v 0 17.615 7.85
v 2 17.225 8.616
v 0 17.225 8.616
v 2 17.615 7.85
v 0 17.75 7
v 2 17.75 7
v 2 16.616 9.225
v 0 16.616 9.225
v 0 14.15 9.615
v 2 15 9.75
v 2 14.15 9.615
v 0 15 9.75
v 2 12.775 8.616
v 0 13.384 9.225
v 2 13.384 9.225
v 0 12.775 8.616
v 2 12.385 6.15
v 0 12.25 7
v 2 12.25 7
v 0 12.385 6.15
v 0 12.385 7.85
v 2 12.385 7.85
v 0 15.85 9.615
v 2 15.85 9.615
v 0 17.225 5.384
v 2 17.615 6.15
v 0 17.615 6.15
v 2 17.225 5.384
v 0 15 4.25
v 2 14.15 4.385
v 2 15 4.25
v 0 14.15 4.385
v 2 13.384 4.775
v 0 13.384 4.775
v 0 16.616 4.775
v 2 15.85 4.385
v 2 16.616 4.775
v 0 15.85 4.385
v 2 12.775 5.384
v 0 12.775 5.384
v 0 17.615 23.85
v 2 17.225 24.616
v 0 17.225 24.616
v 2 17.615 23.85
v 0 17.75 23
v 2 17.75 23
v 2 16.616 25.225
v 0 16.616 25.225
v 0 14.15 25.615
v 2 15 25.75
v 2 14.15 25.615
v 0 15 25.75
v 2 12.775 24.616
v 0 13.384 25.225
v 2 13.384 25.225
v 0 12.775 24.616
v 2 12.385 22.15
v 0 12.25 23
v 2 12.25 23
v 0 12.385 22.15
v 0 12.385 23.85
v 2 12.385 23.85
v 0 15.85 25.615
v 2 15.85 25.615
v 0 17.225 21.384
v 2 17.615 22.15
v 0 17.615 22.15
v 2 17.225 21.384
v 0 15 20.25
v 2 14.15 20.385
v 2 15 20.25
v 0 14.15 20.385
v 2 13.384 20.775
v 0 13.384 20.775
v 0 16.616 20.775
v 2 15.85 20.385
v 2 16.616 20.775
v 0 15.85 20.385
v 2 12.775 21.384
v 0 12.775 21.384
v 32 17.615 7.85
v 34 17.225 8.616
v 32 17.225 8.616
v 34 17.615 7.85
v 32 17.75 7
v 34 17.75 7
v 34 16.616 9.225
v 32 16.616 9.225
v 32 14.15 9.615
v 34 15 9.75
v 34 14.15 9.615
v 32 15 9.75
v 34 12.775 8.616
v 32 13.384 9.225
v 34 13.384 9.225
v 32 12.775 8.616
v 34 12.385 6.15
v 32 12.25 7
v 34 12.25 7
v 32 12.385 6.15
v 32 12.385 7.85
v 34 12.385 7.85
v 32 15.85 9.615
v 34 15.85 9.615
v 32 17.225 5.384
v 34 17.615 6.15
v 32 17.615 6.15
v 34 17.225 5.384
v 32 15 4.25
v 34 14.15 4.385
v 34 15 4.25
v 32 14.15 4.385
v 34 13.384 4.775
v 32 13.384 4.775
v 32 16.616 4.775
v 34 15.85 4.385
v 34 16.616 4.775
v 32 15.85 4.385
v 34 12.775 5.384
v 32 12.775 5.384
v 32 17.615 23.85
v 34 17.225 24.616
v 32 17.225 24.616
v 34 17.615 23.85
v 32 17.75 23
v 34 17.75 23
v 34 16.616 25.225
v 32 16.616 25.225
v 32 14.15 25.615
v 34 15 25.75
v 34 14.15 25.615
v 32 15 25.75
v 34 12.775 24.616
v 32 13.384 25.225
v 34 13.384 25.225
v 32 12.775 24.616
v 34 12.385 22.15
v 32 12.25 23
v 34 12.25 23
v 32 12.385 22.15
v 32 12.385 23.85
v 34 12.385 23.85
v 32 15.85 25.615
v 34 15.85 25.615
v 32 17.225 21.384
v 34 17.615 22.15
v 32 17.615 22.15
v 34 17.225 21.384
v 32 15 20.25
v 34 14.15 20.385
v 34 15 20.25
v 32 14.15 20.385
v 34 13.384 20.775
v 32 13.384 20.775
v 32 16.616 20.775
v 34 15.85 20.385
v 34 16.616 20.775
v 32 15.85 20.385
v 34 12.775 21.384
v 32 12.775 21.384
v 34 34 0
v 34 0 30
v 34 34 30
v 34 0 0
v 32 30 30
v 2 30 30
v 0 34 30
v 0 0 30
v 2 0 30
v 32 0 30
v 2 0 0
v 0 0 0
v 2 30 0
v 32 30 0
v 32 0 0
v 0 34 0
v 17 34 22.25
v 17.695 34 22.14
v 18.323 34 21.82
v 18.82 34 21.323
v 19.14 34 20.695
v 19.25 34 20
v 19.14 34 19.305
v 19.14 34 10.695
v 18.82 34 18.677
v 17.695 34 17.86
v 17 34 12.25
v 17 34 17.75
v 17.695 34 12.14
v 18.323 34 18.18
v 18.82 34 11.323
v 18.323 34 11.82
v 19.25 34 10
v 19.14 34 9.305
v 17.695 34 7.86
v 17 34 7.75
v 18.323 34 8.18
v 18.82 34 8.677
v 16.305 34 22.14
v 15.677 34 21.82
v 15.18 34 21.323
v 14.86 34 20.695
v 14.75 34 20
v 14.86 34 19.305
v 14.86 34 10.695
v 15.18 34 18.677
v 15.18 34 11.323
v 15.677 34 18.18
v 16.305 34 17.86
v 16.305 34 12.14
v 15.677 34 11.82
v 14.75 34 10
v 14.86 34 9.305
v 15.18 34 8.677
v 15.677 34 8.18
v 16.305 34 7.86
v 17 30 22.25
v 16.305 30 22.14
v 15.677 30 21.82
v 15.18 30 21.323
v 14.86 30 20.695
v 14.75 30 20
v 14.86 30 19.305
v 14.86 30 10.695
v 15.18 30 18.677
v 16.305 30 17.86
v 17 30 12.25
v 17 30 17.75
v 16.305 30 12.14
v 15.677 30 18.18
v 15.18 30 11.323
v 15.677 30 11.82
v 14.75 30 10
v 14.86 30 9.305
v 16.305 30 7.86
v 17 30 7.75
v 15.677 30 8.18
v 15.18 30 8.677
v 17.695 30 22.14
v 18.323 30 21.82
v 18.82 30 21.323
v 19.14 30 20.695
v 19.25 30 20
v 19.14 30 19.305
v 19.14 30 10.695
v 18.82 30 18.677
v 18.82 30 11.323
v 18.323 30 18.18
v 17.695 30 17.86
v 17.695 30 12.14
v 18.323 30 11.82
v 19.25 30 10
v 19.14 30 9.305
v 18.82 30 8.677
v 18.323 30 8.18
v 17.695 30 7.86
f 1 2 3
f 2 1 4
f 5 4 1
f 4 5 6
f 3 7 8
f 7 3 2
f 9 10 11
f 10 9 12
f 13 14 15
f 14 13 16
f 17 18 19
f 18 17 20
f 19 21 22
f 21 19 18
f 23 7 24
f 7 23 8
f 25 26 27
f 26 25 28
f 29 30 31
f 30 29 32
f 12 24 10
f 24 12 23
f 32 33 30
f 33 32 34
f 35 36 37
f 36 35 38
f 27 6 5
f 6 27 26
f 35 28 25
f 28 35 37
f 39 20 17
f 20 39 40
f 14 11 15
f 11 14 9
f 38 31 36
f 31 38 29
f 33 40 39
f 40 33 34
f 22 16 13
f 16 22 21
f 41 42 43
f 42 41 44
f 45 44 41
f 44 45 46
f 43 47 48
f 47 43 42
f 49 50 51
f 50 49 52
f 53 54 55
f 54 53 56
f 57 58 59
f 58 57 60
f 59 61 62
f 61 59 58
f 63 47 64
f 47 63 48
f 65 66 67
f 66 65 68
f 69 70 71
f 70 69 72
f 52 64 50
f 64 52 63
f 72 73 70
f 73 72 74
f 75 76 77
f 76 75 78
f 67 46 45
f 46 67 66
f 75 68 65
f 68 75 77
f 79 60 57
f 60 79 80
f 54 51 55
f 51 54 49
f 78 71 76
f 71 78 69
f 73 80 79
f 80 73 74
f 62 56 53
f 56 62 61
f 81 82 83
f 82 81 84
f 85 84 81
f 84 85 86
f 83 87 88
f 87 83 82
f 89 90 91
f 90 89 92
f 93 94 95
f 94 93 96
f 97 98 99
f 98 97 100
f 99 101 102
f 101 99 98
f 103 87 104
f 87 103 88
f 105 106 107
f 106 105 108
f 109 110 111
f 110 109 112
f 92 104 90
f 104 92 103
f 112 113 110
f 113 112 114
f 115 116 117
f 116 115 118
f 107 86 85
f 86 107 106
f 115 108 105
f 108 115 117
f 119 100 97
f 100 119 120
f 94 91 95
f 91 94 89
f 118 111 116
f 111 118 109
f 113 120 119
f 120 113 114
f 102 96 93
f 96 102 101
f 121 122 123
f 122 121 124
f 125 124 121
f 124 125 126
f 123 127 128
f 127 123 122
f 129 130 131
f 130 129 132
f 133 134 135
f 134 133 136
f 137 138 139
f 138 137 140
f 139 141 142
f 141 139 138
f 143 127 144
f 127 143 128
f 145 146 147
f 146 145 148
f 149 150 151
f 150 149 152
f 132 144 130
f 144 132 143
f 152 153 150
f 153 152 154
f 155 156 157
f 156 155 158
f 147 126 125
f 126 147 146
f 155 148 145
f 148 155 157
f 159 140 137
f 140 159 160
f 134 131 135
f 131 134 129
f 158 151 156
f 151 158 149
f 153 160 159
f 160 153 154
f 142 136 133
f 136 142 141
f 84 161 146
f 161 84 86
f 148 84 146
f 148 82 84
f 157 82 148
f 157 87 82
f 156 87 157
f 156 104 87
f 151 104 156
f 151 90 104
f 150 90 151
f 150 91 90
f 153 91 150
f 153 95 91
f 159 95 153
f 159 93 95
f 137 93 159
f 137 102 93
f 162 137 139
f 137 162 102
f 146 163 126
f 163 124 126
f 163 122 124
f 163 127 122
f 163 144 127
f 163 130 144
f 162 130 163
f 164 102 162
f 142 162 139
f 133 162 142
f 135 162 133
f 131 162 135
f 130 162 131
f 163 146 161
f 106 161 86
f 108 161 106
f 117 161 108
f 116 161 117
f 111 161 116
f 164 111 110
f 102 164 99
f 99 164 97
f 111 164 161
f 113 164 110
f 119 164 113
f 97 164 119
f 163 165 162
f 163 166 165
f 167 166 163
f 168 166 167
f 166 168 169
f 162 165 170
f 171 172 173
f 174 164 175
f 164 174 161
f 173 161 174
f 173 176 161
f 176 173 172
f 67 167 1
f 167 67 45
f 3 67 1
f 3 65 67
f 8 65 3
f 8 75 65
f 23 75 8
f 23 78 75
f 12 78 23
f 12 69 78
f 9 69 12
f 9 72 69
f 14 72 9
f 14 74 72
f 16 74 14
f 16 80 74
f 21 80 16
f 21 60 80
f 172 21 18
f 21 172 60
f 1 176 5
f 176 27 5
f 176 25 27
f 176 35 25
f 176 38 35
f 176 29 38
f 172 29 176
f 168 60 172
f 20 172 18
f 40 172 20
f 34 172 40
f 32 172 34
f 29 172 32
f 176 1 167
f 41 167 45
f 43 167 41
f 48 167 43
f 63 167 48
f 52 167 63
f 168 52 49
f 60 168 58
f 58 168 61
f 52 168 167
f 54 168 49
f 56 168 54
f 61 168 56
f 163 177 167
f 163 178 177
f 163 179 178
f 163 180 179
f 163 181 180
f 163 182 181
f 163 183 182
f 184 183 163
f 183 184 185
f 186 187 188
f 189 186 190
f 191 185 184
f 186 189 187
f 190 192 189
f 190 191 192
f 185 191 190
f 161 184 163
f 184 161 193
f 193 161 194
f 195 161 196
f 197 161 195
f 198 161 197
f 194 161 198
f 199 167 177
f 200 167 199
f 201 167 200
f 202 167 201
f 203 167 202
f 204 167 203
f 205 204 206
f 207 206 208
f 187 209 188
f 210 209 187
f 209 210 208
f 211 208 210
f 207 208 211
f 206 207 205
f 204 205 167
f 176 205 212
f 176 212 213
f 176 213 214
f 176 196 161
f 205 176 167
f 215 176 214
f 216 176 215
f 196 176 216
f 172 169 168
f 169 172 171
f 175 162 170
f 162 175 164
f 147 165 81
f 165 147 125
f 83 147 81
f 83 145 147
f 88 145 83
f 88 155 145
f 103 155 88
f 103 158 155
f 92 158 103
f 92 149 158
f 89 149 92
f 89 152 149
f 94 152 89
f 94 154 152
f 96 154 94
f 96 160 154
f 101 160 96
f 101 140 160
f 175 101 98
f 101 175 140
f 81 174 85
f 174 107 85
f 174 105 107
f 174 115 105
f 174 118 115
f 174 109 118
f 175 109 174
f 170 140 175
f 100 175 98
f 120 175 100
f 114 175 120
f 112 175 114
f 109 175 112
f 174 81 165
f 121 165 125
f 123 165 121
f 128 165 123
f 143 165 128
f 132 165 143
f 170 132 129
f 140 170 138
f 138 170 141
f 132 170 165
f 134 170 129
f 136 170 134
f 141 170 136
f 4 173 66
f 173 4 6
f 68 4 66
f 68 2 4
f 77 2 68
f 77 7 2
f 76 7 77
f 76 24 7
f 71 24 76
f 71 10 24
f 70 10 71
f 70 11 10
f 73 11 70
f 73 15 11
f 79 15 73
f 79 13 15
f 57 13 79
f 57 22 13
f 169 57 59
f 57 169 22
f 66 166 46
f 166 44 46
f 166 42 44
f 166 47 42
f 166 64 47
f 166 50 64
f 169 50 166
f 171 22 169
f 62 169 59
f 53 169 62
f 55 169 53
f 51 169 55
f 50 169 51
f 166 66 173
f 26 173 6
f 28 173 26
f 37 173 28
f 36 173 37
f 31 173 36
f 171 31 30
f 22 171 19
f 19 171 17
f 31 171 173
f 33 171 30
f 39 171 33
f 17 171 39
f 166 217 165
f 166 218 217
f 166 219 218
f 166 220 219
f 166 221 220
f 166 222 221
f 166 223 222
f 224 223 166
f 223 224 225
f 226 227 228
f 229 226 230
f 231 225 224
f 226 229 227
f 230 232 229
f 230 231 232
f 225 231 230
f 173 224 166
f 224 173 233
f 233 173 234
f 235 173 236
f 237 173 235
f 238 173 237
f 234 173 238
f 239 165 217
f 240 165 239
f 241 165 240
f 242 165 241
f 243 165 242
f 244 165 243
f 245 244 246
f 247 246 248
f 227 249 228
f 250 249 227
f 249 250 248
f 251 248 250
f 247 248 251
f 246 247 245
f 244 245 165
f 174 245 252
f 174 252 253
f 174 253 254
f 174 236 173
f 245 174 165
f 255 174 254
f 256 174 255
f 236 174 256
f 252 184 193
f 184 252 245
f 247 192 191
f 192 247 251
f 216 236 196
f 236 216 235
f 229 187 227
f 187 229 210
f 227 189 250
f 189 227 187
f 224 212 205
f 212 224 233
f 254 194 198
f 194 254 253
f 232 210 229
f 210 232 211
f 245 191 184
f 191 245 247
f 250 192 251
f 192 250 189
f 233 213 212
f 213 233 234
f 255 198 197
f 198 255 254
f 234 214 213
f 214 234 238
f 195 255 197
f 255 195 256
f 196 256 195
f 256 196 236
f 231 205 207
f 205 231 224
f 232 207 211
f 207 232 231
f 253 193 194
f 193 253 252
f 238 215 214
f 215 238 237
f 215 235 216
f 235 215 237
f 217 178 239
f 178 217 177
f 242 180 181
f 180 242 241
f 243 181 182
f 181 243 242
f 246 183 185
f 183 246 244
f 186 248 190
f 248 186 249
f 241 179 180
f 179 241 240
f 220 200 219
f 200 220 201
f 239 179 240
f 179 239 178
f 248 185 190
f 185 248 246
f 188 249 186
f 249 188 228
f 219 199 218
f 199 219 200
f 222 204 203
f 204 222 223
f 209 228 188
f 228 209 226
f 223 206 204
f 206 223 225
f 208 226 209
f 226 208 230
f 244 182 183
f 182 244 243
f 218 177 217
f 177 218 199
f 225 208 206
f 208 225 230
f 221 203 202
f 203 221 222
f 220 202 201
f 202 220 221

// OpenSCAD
// file: ../lib/ALU_profile_holder_side.scad
include <../../parameters.scad>



module ALU_profile_holder_side() {
    wall_thickness = ALU_profile_holder_wall_thickness;
    
    //díry na přišroubování k Al profilům
    module screws_holes(diameter) {
        translate([0, 0, 7])
            rotate([90, 0, 90])
                cylinder(d=diameter, h=wall_thickness*2, center=true, $fn=20);
        
        translate([0, 0, strain_gauge_screw_distance+13])
            rotate([90, 0, 90])
                cylinder(d=diameter, h=wall_thickness*2, center=true, $fn=20);
    }
    
    difference() {
        cube([ALU_profile_width+wall_thickness*2, ALU_profile_width+wall_thickness*2, strain_gauge_screw_distance+20]);

        translate([wall_thickness, 0, 0])
        cube([ALU_profile_width, ALU_profile_width, strain_gauge_screw_distance+20]);
        
        translate([wall_thickness*0.5, ALU_profile_width/2, 0]) {
                screws_holes(M5_screw_diameter);
                translate([ALU_profile_width+wall_thickness, 0, 0]) {
                    screws_holes(M5_screw_diameter);
                }
        }
    }
}

ALU_profile_holder_side();
// file: ../../parameters.scad
//Main tube diameter - hole [mm]
main_tube_outer_diameter = 25.4;
main_tube_inner_diameter = 23.05;

//Tube for undercarriage - rendered hole [mm]
tube_for_undercarriage_outer_diameter = 10.6;
tube_for_undercarriage_inner_diameter = 6;
global_clearance = 0.5;


// Nastavení parametrů rotoru

gliding_aggle = 14;         // tenhle úhel by se zřejmě v budoucnu měl počítat z požadované klouzavosti.


rotor_blade_AOA = 1.5;      // nastavení úhlu náběhu rotorového listu
rotor_blade_length = 970;   // délka rotorového listu
rotor_blade_depth = 50;     // hloubka rotorového listu

// nastavení parametrů motoru

engine_angle = -8;
engine_diameter = 55;
engine_offset = 55;

engine_screws_radius = 15;
engine_holes_radius = (24 + 44)/4;
engine_shatf_hole_diameter = 13;

// Parameters of tube couplings
coupling_wall_thickness = main_tube_outer_diameter/5;  //width of coupling walls
thickness_between_tubes = main_tube_outer_diameter/10;    // minimum distance between tubes in couplings

coupling_wall_thickness_undercarriage = tube_for_undercarriage_outer_diameter/3;
thickness_between_tubes_undercarriage = tube_for_undercarriage_outer_diameter/10;

608_bearing_outer_diameter = 22.3;
608_bearing_thickness = 7.1;


// screw length step - minimum difference in length between two types of screws
basic_screw_length = 5;


//Screw diameter and nut for M10 [mm]
M10_screw_diameter=10.4;
M10_head_height = 10;
M10_head_diameter = 16+0.5;
M10_nut_height = 10.5;
M10_nut_diameter = 25.5;
M10_nut_pocket = 22.3;

//Screw diameter for M8 [mm]
M8_screw_diameter = 8.6;
M8_head_height = 8;
M8_head_diameter = 13.5;
M8_nut_height = 7.5;
M8_nut_diameter = 14.4 + 0.5;
M8_nut_pocket = 13 + 0.5;

//Screw diameter and nut for M6 [mm]
M6_screw_diameter=6.5;
M6_head_diameter = 10+0.5;
M6_head_height = 6;
M6_nut_height = 4.9;
M6_nut_diameter = 11.8;
M6_nut_pocket = 10.4;

//Screw diameter and nut for M5 [mm]
M5_screw_diameter=5.5;
M5_head_height = 5;
M5_head_diameter = 13+0.5;
M5_nut_height = 4.5;
M5_nut_diameter = 9.4;
M5_nut_pocket = 8.4;

//Screw diameter and nut for M4 [mm]
M4_screw_diameter=4.5;
M4_screw_head_height = 4;
M4_nut_height = 3.2;
M4_nut_diameter = 8.4;
M4_nut_pocket = 7.5;

//Screw diameter and nut for M3 [mm]
M3_screw_diameter = 3.2;
M3_nut_height = 2.7;
M3_nut_diameter = 6.6;
M3_screw_head_height = 3;

//Screw diameter and nut for M2,5 [mm]
M2_5_screw_diameter = 2.7;
M2_5_nut_height = 2.3;
M2_5_nut_diameter = 6;
M2_5_nut_pocket = 5.5;


//šroub servo
Servo_screw = 1.5;

//The tube for help
Help_main_tube_outer = 25;
Help_main_tube_inner = 23;
Help_tube_for_undercarriage_outer = 10;
Help_tube_for_undercarriage_inner = 5;


//main hull parameters

hull_drop_length = 580;
hull_wall_thickness = 0.8;
hull_y_size = 120;
hull_z_size = 150;
hull_x_size = 580;
hull_corner_radius = 4;
hull_airfoil_thickness= 35;  // thickness of drop generating airfoil in percent of length.
hull_scale_x = 1;
hull_scale_y = 1.5;
hull_scale_z = 1.5;

main_pilon_position = 170+68+30;       // pozice rotorového pilonu měřená od přední části krytu
cover_pilon_position = 180;
height_of_vertical_tube = 275; //278mm je změřená délka trubky.

//délka hlavní dlouhé trubky
length_of_main_tube = 820;
length_of_undercarriage_tube = 300;

ribbon_width = 5; // šířka vyztužovacích lemů.

// šířka otvoru v přední části kapoty pro držák motoru.
width_of_engine_holder = 63;

//Top Cover Division - dělení horního krytu pro tisk
top_cover_division = [0, 50, 150, 280, 410, hull_x_size]; // upraveny seznam tak, aby deleni začinalo od nuly, což umožňí úplně automatické rozdělení.

//Bottom Cover Division - dělení dolního krytu pro tisk
bottom_cover_division = [0,100,232.5,365, 470, hull_x_size];
// zkrácená část pro payload pro testovací tisk
//bottom_cover_division = [0,200,250,365, 470, hull_x_size];




rotor_height = height_of_vertical_tube + main_tube_outer_diameter/2 + 2*global_clearance + thickness_between_tubes + 30; // změřená výška rotoru je 367mm
center_of_gravity_position = [main_pilon_position - tan(gliding_aggle)*rotor_height, 0, 0];



//Cover pilon division - na výšku (v ose Z)
cover_pilon_division = [0,170,height_of_vertical_tube + main_tube_outer_diameter + coupling_wall_thickness];

//pozice šroubů
	//horní kryt
top_screw_position = [0,
                    (top_cover_division[0] + top_cover_division[1])/2,
                    (top_cover_division[2] - top_cover_division[1])/2 + top_cover_division[1],
                    (top_cover_division[3] - top_cover_division[2])/2 + top_cover_division[2],
                    (top_cover_division[4] - top_cover_division[3])/8 + top_cover_division[3],
                    (top_cover_division[5] - top_cover_division[4])/2 + top_cover_division[4] - top_cover_division[1]/3];
	//spodní kryt
bottom_screw_position = [0,
                        (bottom_cover_division[0] + bottom_cover_division[1])*(2/6),
                        bottom_cover_division[1]*(9/10),
                        bottom_cover_division[3] + bottom_cover_division[1]*(1/10),
                        bottom_cover_division[3] + bottom_cover_division[1]*(3/5)];




//šířka zámků
lock_width = 10;

//délka zámků
lock_length = 3;


//accumulator
//základní rozměry akumulátoru
width_of_accumulator = 129.4;//45+1;
depth_of_accumulator = 40.61;
height_of_accumulator = 43.65;
//Zapuštění akumulátoru
sink_of_accumulator = 5; //main_tube_outer_diameter/5 - M3_nut_height*1.5;

//tloušťka hrany spojky
accumulator_holder_width = 18;
accumulator_holder_thickness = 10;

//posunutí akumálátoru na podložce
move_of_accumulator = 75;   // pozice akumulátoru (ovlivňuje těžiště)


////////////////
// Senzory
///////////////////

//opticalFlow
width_optical_flow_senzor = 45.5;
depth_optical_flow_senzor = 6;
height_optical_flow_senzor = 35;
sink_of_optical_flow_senzor = depth_optical_flow_senzor - 5;
M3_optical_flow_senzor_Z = 30.4;
M3_optical_flow_senzor_X = 24;
M3_optical_flow_senzor_Z_alone = 9.1;
M3_optical_flow_senzor_X_alone = 16.7;

//GPS anténa
GPS_outer_length = 48.01;   //Vnější rozměr
GPS_inner_length = 37.48;   //Vnitřní rozměr
GPS_diameter = (GPS_outer_length - GPS_inner_length)/2;    //Průměr otvoru
GPS_middle_length = GPS_diameter + GPS_inner_length;      //Střední rozměr


////podzvozek

radius_undercarriage = 25;
vzdalenost_x = tan(20) * 131;
vzdalenost_y = (131 - radius_undercarriage)/tan(79);
uhel_y = 90 - 20;
uhel_x = 90 - 79;

maximum_printable_size = 150;


////Pitotova trubice
Pitot_tube_diameter = 4.02 + 1;
Distance_hole_from_tube = 11.92;  //vzdálenost otvoru pro připevnění od samotné trubičky


////směrové kormidlo
Rudder_length = 4*main_tube_outer_diameter;
Rudder_height = 2*main_tube_outer_diameter;
Rudder_depth = main_tube_outer_diameter/2;
gap_width = 2*hull_wall_thickness;      //šířka mezery mezi směrovkou a ocasní plochou
ruder_shaft_diameter = 2.6; //otočné uchycení směrovky - průměr 2 mm


/////spojka 666_1004

    width_666_1004 = (main_tube_outer_diameter+2*coupling_wall_thickness - M3_screw_head_height)/basic_screw_length;
//        echo("width_666_1004 is", width_666_1004);

//        echo("ceil_666_1004 is", ceil(width_666_1004));

    coupling_screw_length_666_1004 = (ceil(width_666_1004)) * basic_screw_length;
        echo("coupling_screw_length_666_1004 is", coupling_screw_length_666_1004);

    coupling_width_666_1004 = coupling_screw_length_666_1004 + M3_screw_head_height;
//        echo("coupling_width_666_1004 is", coupling_width_666_1004);

    height_666_1004 = coupling_width_666_1004;
//        echo("height_666_1004 is", height_666_1004);

    depth_666_1004 = main_tube_outer_diameter*2+2*coupling_wall_thickness+thickness_between_tubes;
//        echo("depth_666_1004 is", depth_666_1004);

    depth_666_1004_drillhelper = main_tube_outer_diameter*3;

/////spojka 666_1026



    width_666_1026 = main_tube_outer_diameter + 2*thickness_between_tubes;

    depth_666_1026 = (main_tube_outer_diameter*2)/basic_screw_length;
//        echo("depth_666_1026 is", depth_666_1026);

//        echo("ceil_666_1026 is", ceil(depth_666_1026));

    coupling_screw_length_666_1026 = (ceil(depth_666_1026)) * basic_screw_length;
        echo("coupling_screw_length_666_1026 is", coupling_screw_length_666_1026);


    thickness_of_plate = coupling_screw_length_666_1026 - M4_screw_head_height - 50; //50 mm je konstatní šířka spojky 666_1026
    echo("thickness_of_plate is", thickness_of_plate);

    coupling_depth_666_1026 = coupling_screw_length_666_1026 - M4_screw_head_height - thickness_of_plate;      //zde je odečten M4_screw_head_height pro určení šířky, tak aby šroub přesahoval pro potřebnou matku
//        echo("coupling_depth_666_1026 is", coupling_depth_666_1026);

    height_666_1026 = 2*main_tube_outer_diameter;
//        echo("height_666_1026 is", height_666_1026);

//tloušťka plechu pro zajištění konstatní šířky spojky 50 mm

    width_666_1026_drillhelper = main_tube_outer_diameter*2;

    depth_666_1026_drillhelper = main_tube_outer_diameter + 4*thickness_between_tubes;


////spojka 666_1017

    width_666_1017 = (main_tube_outer_diameter + 4*coupling_wall_thickness - M3_screw_head_height)/basic_screw_length;
//        echo("width_666_1017 is", width_666_1017);

//        echo("ceil_666_1017 is", ceil(width_666_1017));

    coupling_screw_length_666_1017 = (ceil(width_666_1017)) * basic_screw_length;
        echo("coupling_screw_length_666_1017 is", coupling_screw_length_666_1017);

    coupling_width_666_1017 = coupling_screw_length_666_1017 + M3_screw_head_height;
//        echo("coupling_width_666_1017 is", coupling_width_666_1017);

    depth_666_1017 = coupling_width_666_1017;

    height_666_1017= 70; //main_tube_outer_diameter*1.8+main_tube_outer_diameter+wall_thickness;

    width_666_1017_drillhelper = main_tube_outer_diameter+4*thickness_between_tubes;

    depth_666_1017_drillhelper = main_tube_outer_diameter*2;


////spojka 666_1014

    width_666_1014 = tube_for_undercarriage_outer_diameter + 2*coupling_wall_thickness_undercarriage;

    depth_666_1014 = tube_for_undercarriage_outer_diameter + M3_screw_diameter + 2*coupling_wall_thickness_undercarriage + thickness_between_tubes_undercarriage;

    height_666_1014 = width_666_1014;


    width_666_1014_drillhelper = 2*tube_for_undercarriage_outer_diameter + 2*coupling_wall_thickness_undercarriage;



////spojka 666_1015

    width_666_1015 = tube_for_undercarriage_outer_diameter + 2*coupling_wall_thickness_undercarriage;

    depth_666_1015 = tube_for_undercarriage_outer_diameter*2 + 2*coupling_wall_thickness_undercarriage + thickness_between_tubes_undercarriage;

    height_666_1015 = width_666_1015;


    width_666_1015_drillhelper = 2*tube_for_undercarriage_outer_diameter + 2*coupling_wall_thickness_undercarriage;

////spojka 666_1016

    width_666_1016 = tube_for_undercarriage_outer_diameter + 2*coupling_wall_thickness_undercarriage;

    depth_666_1016 = tube_for_undercarriage_outer_diameter + M6_screw_diameter + 2*coupling_wall_thickness_undercarriage + thickness_between_tubes_undercarriage;

    height_666_1016 = width_666_1016;


    width_666_1016_drillhelper = 2*tube_for_undercarriage_outer_diameter + 2*coupling_wall_thickness_undercarriage;




//umístění podvozkových trubek

second_undercarriage_hole =height_666_1026 + height_666_1004/2 + 170 + 160;


//Base Divison - dělení podložky
base_division = [0, 159, main_pilon_position + coupling_width_666_1017/2 + global_clearance/2, second_undercarriage_hole + coupling_width_666_1004/2 + global_clearance/2, hull_x_size];

// šrouby pro připevnění podložky k hlavní trubce
base_mounting_screw_length = 50;


// kulove lozisko

bearing_efsm_08_h = 33+1;
bearing_efsm_08_m = 22;
bearing_efsm_08_db = 18;
bearing_efsm_08_ag = 10.5;
bearing_efsm_08_n = M4_screw_diameter;
bearing_efsm_08_a1 = 5.5;
bearing_efsm_08_d = 8.25;
bearing_efsm_08_B = 8; // ball height

bearing_efsm_10_h = 38+1;
bearing_efsm_10_m = 26;
bearing_efsm_10_db = 21.9;
bearing_efsm_10_ag = 12+0.2;
bearing_efsm_10_n = M5_screw_diameter;
bearing_efsm_10_a1 = 6.5;
bearing_efsm_10_d = 10.25;


bearing_efsm_12_width = 40+1;
bearing_efsm_12_h = bearing_efsm_12_width;
bearing_efsm_12_boltd = 28/2; // polovina vzdalenosti mezi srouby
bearing_efsm_12_m = bearing_efsm_12_boltd*2;
bearing_efsm_12_db = 25;
bearing_efsm_12_ag = 13;
bearing_efsm_12_a1 = 7;
bearing_efsm_12_n = M5_screw_diameter;
bearing_efsm_12_d = 12.15;
bearing_efsm_12_B = 10; // ball height
bearing_efsm_space = 1;

bearing_efsm_17_width = 54+1;
bearing_efsm_17_h = bearing_efsm_17_width;
bearing_efsm_17_boltd = 38/2; // polovina vzdalenosti mezi srouby
bearing_efsm_17_m = bearing_efsm_17_boltd*2;
bearing_efsm_17_db = 35;
bearing_efsm_17_ag = 18;
bearing_efsm_17_n = M6_screw_diameter;
bearing_efsm_17_a1 = 10;
bearing_efsm_17_B = 17; // ball height

//limcove lozisko
bearing_EFOM_10_L=26; //celkova sirka zakladny
bearing_EFOM_10_d1=10.3;//diametr otvoru real=10 mm
bearing_EFOM_10_dB=22;//diametr vystupku pro ulozeni lozika
bearing_EFOM_10_H=52;//celková delka zakladny
bearing_EFOM_10_J=36;// hole pitch
bearing_EFOM_10_A1=6.5;//vyska pouzdra
bearing_EFOM_10_Ag=12;//celkova vyska
bearing_EFOM_10_N1=5;//sirka otvoru pro sroub
bearing_EFOM_10_N2=8;//delka otvoru pro sroub
bearing_EFOM_10_m=36;//roztec der pro sroub
bearing_EFOM_10_h=9;//vyska lozika




// 20 KG servo parameters


servo_20kg_axis_offset = 9.375; // jak je osa mimo stredu
servo_20kg_body_x = 42;
servo_20kg_body_y = 21;
servo_20kg_body_z = 40;
servo_20kg_thread_x = 49/2;
servo_20kg_thread_y = 10/2;
servo_20kg_body_below = 10; // jak hluboko je tělo serva pod drzaky na srouby
servo_20kg_below = 25.8; // jak hluboko je páka serva pod drzaky na srouby

servo_20kg_bolt_d = 2.5+0.3;
servo_20kg_nut_d = 5+0.3;



//  888_2***
//    G2
//


g2_0_part_space = 2; // mezera mezi zadni a predni casti

g2_5_height = 608_bearing_outer_diameter*1.5;
g2_5_width = 70+5.5+11;
g2_5_threads = 2; // kolik ma byt sroubu skrz nosnou tyc

g2_5_m3_length = base_mounting_screw_length; // sroub, ktery se pouziva na sesroubovani s nosnou tyci
g2_5_servo_shift = 30;
g2_5_servo_wall = 5;

g2_5_m8_length = 60; // sroub, ktery se pouziva jako osa pro podlozku
g2_5_front_l = main_tube_outer_diameter + 608_bearing_outer_diameter*2;// jak moc ma byt magnet v predu

g2_5_zapusteni_serva = 30;
g2_5_length = g2_5_zapusteni_serva + 2*main_tube_outer_diameter + 30;
g2_5_length_offset = -10;

g2_5_bearing_space = 2; // mezera pro podlozku mezi loziskem a stenou..


g2_0_vertical_bolts = 2;
g2_0_space_btw_wheel_holder = 25.8;

g2_6_plate_thickness = 8;
g2_6_servo_distance = 54; // jak je daleko servo pred tyci kola
g2_6_servo_shift = 0; // jak je osa serva mimo stredu
g2_6_servo_bolt_l = 8; // delka sroubu od konce serva po zacatek matky
g2_6_min_wall_around = 8; // minimalni material okolo serva




// pro dily ze skupiny 3 (888_30**)
g3_0_cone1 = 70;
g3_0_cone2 = 50;
g3_0_cone_height = 25;
g3_0_cone_top_height = 11;
g3_0_height = g3_0_cone_height + 40;
g3_0_bearing_bolt_len = 50;
g3_0_srcew_dist = 55;


// Nastavní volností skupiny dílů 888_30**
// Nastavení rozsahů je v deg
g3_0_pitch_limit = [-20:3:20];
g3_0_roll_limit = [-15:3:15];
g3_0_yaw_limit = [-10:3:10];


//pro zakladnu na strechu auta
g3_1_yaw_width = 75;
g3_1_service_holl_height = 8.4 + 2;
g3_1_service_holl_width = 16 + 1.5;

//pro druhy dil
g3_7_length = maximum_printable_size;
g3_7_width = bearing_efsm_17_width + 2*1+ 2*3;
g3_7_height = M8_screw_diameter*3;

g3_8_magnet_wall_thickness = 7;  // tloustka steny u magnetu
g3_8_bearing_wall_thickness = bearing_efsm_12_ag-bearing_efsm_12_a1;
g3_8_magnet_diameter = 63;
g3_8_cylinder_d = 55; // prumer valce
g3_8_cylinder_h = 30 + g3_8_magnet_wall_thickness;
g3_8_m5_lenght = 40; // delka sroubu pro pridelani kuloveho loziska
g3_8_pocket_wall = g3_8_cylinder_h-(g3_8_m5_lenght-bearing_efsm_12_a1-M5_nut_height-5);

// podlozka na strechu auta
g3_9_height = 145;



servo_20kg_width = 21;   //šřka otvoru pro servo
servo_20kg_height = 42;  //výška otvoru pro servo

//strain gauge
strain_gauge_width = 12.7;
strain_gauge_length = 75.1;
strain_gauge_screw_distance = 10;

//ALU profile
ALU_profile_width = 30;
ALU_profile_holder_wall_thickness = 2;

//ložisko
bearing_outer_diameter = 22;
bearing_inner_diameter = 8;
bearing_height = 7;
// main file
include <../../parameters.scad>
use <../lib/ALU_profile_holder_side.scad>


module 888_5001() {
    wall_thickness = ALU_profile_holder_wall_thickness;
    
    difference() {
        ALU_profile_holder_side();
        
        //díry pro šrouby na uchycení tenzometru
        translate([ALU_profile_width/2+wall_thickness, ALU_profile_width+wall_thickness*2-0.5, (strain_gauge_screw_distance+20)/2-strain_gauge_screw_distance/2]) {
            rotate([90, 0, 0])
            cylinder(d=M4_screw_diameter, h=wall_thickness*4, center=true, $fn=20);
            translate([0, 0, strain_gauge_screw_distance])
                rotate([90, 0, 0])
                    cylinder(d=M4_screw_diameter, h=wall_thickness*4, center=true, $fn=20);
        }
    }
}

888_5001();
